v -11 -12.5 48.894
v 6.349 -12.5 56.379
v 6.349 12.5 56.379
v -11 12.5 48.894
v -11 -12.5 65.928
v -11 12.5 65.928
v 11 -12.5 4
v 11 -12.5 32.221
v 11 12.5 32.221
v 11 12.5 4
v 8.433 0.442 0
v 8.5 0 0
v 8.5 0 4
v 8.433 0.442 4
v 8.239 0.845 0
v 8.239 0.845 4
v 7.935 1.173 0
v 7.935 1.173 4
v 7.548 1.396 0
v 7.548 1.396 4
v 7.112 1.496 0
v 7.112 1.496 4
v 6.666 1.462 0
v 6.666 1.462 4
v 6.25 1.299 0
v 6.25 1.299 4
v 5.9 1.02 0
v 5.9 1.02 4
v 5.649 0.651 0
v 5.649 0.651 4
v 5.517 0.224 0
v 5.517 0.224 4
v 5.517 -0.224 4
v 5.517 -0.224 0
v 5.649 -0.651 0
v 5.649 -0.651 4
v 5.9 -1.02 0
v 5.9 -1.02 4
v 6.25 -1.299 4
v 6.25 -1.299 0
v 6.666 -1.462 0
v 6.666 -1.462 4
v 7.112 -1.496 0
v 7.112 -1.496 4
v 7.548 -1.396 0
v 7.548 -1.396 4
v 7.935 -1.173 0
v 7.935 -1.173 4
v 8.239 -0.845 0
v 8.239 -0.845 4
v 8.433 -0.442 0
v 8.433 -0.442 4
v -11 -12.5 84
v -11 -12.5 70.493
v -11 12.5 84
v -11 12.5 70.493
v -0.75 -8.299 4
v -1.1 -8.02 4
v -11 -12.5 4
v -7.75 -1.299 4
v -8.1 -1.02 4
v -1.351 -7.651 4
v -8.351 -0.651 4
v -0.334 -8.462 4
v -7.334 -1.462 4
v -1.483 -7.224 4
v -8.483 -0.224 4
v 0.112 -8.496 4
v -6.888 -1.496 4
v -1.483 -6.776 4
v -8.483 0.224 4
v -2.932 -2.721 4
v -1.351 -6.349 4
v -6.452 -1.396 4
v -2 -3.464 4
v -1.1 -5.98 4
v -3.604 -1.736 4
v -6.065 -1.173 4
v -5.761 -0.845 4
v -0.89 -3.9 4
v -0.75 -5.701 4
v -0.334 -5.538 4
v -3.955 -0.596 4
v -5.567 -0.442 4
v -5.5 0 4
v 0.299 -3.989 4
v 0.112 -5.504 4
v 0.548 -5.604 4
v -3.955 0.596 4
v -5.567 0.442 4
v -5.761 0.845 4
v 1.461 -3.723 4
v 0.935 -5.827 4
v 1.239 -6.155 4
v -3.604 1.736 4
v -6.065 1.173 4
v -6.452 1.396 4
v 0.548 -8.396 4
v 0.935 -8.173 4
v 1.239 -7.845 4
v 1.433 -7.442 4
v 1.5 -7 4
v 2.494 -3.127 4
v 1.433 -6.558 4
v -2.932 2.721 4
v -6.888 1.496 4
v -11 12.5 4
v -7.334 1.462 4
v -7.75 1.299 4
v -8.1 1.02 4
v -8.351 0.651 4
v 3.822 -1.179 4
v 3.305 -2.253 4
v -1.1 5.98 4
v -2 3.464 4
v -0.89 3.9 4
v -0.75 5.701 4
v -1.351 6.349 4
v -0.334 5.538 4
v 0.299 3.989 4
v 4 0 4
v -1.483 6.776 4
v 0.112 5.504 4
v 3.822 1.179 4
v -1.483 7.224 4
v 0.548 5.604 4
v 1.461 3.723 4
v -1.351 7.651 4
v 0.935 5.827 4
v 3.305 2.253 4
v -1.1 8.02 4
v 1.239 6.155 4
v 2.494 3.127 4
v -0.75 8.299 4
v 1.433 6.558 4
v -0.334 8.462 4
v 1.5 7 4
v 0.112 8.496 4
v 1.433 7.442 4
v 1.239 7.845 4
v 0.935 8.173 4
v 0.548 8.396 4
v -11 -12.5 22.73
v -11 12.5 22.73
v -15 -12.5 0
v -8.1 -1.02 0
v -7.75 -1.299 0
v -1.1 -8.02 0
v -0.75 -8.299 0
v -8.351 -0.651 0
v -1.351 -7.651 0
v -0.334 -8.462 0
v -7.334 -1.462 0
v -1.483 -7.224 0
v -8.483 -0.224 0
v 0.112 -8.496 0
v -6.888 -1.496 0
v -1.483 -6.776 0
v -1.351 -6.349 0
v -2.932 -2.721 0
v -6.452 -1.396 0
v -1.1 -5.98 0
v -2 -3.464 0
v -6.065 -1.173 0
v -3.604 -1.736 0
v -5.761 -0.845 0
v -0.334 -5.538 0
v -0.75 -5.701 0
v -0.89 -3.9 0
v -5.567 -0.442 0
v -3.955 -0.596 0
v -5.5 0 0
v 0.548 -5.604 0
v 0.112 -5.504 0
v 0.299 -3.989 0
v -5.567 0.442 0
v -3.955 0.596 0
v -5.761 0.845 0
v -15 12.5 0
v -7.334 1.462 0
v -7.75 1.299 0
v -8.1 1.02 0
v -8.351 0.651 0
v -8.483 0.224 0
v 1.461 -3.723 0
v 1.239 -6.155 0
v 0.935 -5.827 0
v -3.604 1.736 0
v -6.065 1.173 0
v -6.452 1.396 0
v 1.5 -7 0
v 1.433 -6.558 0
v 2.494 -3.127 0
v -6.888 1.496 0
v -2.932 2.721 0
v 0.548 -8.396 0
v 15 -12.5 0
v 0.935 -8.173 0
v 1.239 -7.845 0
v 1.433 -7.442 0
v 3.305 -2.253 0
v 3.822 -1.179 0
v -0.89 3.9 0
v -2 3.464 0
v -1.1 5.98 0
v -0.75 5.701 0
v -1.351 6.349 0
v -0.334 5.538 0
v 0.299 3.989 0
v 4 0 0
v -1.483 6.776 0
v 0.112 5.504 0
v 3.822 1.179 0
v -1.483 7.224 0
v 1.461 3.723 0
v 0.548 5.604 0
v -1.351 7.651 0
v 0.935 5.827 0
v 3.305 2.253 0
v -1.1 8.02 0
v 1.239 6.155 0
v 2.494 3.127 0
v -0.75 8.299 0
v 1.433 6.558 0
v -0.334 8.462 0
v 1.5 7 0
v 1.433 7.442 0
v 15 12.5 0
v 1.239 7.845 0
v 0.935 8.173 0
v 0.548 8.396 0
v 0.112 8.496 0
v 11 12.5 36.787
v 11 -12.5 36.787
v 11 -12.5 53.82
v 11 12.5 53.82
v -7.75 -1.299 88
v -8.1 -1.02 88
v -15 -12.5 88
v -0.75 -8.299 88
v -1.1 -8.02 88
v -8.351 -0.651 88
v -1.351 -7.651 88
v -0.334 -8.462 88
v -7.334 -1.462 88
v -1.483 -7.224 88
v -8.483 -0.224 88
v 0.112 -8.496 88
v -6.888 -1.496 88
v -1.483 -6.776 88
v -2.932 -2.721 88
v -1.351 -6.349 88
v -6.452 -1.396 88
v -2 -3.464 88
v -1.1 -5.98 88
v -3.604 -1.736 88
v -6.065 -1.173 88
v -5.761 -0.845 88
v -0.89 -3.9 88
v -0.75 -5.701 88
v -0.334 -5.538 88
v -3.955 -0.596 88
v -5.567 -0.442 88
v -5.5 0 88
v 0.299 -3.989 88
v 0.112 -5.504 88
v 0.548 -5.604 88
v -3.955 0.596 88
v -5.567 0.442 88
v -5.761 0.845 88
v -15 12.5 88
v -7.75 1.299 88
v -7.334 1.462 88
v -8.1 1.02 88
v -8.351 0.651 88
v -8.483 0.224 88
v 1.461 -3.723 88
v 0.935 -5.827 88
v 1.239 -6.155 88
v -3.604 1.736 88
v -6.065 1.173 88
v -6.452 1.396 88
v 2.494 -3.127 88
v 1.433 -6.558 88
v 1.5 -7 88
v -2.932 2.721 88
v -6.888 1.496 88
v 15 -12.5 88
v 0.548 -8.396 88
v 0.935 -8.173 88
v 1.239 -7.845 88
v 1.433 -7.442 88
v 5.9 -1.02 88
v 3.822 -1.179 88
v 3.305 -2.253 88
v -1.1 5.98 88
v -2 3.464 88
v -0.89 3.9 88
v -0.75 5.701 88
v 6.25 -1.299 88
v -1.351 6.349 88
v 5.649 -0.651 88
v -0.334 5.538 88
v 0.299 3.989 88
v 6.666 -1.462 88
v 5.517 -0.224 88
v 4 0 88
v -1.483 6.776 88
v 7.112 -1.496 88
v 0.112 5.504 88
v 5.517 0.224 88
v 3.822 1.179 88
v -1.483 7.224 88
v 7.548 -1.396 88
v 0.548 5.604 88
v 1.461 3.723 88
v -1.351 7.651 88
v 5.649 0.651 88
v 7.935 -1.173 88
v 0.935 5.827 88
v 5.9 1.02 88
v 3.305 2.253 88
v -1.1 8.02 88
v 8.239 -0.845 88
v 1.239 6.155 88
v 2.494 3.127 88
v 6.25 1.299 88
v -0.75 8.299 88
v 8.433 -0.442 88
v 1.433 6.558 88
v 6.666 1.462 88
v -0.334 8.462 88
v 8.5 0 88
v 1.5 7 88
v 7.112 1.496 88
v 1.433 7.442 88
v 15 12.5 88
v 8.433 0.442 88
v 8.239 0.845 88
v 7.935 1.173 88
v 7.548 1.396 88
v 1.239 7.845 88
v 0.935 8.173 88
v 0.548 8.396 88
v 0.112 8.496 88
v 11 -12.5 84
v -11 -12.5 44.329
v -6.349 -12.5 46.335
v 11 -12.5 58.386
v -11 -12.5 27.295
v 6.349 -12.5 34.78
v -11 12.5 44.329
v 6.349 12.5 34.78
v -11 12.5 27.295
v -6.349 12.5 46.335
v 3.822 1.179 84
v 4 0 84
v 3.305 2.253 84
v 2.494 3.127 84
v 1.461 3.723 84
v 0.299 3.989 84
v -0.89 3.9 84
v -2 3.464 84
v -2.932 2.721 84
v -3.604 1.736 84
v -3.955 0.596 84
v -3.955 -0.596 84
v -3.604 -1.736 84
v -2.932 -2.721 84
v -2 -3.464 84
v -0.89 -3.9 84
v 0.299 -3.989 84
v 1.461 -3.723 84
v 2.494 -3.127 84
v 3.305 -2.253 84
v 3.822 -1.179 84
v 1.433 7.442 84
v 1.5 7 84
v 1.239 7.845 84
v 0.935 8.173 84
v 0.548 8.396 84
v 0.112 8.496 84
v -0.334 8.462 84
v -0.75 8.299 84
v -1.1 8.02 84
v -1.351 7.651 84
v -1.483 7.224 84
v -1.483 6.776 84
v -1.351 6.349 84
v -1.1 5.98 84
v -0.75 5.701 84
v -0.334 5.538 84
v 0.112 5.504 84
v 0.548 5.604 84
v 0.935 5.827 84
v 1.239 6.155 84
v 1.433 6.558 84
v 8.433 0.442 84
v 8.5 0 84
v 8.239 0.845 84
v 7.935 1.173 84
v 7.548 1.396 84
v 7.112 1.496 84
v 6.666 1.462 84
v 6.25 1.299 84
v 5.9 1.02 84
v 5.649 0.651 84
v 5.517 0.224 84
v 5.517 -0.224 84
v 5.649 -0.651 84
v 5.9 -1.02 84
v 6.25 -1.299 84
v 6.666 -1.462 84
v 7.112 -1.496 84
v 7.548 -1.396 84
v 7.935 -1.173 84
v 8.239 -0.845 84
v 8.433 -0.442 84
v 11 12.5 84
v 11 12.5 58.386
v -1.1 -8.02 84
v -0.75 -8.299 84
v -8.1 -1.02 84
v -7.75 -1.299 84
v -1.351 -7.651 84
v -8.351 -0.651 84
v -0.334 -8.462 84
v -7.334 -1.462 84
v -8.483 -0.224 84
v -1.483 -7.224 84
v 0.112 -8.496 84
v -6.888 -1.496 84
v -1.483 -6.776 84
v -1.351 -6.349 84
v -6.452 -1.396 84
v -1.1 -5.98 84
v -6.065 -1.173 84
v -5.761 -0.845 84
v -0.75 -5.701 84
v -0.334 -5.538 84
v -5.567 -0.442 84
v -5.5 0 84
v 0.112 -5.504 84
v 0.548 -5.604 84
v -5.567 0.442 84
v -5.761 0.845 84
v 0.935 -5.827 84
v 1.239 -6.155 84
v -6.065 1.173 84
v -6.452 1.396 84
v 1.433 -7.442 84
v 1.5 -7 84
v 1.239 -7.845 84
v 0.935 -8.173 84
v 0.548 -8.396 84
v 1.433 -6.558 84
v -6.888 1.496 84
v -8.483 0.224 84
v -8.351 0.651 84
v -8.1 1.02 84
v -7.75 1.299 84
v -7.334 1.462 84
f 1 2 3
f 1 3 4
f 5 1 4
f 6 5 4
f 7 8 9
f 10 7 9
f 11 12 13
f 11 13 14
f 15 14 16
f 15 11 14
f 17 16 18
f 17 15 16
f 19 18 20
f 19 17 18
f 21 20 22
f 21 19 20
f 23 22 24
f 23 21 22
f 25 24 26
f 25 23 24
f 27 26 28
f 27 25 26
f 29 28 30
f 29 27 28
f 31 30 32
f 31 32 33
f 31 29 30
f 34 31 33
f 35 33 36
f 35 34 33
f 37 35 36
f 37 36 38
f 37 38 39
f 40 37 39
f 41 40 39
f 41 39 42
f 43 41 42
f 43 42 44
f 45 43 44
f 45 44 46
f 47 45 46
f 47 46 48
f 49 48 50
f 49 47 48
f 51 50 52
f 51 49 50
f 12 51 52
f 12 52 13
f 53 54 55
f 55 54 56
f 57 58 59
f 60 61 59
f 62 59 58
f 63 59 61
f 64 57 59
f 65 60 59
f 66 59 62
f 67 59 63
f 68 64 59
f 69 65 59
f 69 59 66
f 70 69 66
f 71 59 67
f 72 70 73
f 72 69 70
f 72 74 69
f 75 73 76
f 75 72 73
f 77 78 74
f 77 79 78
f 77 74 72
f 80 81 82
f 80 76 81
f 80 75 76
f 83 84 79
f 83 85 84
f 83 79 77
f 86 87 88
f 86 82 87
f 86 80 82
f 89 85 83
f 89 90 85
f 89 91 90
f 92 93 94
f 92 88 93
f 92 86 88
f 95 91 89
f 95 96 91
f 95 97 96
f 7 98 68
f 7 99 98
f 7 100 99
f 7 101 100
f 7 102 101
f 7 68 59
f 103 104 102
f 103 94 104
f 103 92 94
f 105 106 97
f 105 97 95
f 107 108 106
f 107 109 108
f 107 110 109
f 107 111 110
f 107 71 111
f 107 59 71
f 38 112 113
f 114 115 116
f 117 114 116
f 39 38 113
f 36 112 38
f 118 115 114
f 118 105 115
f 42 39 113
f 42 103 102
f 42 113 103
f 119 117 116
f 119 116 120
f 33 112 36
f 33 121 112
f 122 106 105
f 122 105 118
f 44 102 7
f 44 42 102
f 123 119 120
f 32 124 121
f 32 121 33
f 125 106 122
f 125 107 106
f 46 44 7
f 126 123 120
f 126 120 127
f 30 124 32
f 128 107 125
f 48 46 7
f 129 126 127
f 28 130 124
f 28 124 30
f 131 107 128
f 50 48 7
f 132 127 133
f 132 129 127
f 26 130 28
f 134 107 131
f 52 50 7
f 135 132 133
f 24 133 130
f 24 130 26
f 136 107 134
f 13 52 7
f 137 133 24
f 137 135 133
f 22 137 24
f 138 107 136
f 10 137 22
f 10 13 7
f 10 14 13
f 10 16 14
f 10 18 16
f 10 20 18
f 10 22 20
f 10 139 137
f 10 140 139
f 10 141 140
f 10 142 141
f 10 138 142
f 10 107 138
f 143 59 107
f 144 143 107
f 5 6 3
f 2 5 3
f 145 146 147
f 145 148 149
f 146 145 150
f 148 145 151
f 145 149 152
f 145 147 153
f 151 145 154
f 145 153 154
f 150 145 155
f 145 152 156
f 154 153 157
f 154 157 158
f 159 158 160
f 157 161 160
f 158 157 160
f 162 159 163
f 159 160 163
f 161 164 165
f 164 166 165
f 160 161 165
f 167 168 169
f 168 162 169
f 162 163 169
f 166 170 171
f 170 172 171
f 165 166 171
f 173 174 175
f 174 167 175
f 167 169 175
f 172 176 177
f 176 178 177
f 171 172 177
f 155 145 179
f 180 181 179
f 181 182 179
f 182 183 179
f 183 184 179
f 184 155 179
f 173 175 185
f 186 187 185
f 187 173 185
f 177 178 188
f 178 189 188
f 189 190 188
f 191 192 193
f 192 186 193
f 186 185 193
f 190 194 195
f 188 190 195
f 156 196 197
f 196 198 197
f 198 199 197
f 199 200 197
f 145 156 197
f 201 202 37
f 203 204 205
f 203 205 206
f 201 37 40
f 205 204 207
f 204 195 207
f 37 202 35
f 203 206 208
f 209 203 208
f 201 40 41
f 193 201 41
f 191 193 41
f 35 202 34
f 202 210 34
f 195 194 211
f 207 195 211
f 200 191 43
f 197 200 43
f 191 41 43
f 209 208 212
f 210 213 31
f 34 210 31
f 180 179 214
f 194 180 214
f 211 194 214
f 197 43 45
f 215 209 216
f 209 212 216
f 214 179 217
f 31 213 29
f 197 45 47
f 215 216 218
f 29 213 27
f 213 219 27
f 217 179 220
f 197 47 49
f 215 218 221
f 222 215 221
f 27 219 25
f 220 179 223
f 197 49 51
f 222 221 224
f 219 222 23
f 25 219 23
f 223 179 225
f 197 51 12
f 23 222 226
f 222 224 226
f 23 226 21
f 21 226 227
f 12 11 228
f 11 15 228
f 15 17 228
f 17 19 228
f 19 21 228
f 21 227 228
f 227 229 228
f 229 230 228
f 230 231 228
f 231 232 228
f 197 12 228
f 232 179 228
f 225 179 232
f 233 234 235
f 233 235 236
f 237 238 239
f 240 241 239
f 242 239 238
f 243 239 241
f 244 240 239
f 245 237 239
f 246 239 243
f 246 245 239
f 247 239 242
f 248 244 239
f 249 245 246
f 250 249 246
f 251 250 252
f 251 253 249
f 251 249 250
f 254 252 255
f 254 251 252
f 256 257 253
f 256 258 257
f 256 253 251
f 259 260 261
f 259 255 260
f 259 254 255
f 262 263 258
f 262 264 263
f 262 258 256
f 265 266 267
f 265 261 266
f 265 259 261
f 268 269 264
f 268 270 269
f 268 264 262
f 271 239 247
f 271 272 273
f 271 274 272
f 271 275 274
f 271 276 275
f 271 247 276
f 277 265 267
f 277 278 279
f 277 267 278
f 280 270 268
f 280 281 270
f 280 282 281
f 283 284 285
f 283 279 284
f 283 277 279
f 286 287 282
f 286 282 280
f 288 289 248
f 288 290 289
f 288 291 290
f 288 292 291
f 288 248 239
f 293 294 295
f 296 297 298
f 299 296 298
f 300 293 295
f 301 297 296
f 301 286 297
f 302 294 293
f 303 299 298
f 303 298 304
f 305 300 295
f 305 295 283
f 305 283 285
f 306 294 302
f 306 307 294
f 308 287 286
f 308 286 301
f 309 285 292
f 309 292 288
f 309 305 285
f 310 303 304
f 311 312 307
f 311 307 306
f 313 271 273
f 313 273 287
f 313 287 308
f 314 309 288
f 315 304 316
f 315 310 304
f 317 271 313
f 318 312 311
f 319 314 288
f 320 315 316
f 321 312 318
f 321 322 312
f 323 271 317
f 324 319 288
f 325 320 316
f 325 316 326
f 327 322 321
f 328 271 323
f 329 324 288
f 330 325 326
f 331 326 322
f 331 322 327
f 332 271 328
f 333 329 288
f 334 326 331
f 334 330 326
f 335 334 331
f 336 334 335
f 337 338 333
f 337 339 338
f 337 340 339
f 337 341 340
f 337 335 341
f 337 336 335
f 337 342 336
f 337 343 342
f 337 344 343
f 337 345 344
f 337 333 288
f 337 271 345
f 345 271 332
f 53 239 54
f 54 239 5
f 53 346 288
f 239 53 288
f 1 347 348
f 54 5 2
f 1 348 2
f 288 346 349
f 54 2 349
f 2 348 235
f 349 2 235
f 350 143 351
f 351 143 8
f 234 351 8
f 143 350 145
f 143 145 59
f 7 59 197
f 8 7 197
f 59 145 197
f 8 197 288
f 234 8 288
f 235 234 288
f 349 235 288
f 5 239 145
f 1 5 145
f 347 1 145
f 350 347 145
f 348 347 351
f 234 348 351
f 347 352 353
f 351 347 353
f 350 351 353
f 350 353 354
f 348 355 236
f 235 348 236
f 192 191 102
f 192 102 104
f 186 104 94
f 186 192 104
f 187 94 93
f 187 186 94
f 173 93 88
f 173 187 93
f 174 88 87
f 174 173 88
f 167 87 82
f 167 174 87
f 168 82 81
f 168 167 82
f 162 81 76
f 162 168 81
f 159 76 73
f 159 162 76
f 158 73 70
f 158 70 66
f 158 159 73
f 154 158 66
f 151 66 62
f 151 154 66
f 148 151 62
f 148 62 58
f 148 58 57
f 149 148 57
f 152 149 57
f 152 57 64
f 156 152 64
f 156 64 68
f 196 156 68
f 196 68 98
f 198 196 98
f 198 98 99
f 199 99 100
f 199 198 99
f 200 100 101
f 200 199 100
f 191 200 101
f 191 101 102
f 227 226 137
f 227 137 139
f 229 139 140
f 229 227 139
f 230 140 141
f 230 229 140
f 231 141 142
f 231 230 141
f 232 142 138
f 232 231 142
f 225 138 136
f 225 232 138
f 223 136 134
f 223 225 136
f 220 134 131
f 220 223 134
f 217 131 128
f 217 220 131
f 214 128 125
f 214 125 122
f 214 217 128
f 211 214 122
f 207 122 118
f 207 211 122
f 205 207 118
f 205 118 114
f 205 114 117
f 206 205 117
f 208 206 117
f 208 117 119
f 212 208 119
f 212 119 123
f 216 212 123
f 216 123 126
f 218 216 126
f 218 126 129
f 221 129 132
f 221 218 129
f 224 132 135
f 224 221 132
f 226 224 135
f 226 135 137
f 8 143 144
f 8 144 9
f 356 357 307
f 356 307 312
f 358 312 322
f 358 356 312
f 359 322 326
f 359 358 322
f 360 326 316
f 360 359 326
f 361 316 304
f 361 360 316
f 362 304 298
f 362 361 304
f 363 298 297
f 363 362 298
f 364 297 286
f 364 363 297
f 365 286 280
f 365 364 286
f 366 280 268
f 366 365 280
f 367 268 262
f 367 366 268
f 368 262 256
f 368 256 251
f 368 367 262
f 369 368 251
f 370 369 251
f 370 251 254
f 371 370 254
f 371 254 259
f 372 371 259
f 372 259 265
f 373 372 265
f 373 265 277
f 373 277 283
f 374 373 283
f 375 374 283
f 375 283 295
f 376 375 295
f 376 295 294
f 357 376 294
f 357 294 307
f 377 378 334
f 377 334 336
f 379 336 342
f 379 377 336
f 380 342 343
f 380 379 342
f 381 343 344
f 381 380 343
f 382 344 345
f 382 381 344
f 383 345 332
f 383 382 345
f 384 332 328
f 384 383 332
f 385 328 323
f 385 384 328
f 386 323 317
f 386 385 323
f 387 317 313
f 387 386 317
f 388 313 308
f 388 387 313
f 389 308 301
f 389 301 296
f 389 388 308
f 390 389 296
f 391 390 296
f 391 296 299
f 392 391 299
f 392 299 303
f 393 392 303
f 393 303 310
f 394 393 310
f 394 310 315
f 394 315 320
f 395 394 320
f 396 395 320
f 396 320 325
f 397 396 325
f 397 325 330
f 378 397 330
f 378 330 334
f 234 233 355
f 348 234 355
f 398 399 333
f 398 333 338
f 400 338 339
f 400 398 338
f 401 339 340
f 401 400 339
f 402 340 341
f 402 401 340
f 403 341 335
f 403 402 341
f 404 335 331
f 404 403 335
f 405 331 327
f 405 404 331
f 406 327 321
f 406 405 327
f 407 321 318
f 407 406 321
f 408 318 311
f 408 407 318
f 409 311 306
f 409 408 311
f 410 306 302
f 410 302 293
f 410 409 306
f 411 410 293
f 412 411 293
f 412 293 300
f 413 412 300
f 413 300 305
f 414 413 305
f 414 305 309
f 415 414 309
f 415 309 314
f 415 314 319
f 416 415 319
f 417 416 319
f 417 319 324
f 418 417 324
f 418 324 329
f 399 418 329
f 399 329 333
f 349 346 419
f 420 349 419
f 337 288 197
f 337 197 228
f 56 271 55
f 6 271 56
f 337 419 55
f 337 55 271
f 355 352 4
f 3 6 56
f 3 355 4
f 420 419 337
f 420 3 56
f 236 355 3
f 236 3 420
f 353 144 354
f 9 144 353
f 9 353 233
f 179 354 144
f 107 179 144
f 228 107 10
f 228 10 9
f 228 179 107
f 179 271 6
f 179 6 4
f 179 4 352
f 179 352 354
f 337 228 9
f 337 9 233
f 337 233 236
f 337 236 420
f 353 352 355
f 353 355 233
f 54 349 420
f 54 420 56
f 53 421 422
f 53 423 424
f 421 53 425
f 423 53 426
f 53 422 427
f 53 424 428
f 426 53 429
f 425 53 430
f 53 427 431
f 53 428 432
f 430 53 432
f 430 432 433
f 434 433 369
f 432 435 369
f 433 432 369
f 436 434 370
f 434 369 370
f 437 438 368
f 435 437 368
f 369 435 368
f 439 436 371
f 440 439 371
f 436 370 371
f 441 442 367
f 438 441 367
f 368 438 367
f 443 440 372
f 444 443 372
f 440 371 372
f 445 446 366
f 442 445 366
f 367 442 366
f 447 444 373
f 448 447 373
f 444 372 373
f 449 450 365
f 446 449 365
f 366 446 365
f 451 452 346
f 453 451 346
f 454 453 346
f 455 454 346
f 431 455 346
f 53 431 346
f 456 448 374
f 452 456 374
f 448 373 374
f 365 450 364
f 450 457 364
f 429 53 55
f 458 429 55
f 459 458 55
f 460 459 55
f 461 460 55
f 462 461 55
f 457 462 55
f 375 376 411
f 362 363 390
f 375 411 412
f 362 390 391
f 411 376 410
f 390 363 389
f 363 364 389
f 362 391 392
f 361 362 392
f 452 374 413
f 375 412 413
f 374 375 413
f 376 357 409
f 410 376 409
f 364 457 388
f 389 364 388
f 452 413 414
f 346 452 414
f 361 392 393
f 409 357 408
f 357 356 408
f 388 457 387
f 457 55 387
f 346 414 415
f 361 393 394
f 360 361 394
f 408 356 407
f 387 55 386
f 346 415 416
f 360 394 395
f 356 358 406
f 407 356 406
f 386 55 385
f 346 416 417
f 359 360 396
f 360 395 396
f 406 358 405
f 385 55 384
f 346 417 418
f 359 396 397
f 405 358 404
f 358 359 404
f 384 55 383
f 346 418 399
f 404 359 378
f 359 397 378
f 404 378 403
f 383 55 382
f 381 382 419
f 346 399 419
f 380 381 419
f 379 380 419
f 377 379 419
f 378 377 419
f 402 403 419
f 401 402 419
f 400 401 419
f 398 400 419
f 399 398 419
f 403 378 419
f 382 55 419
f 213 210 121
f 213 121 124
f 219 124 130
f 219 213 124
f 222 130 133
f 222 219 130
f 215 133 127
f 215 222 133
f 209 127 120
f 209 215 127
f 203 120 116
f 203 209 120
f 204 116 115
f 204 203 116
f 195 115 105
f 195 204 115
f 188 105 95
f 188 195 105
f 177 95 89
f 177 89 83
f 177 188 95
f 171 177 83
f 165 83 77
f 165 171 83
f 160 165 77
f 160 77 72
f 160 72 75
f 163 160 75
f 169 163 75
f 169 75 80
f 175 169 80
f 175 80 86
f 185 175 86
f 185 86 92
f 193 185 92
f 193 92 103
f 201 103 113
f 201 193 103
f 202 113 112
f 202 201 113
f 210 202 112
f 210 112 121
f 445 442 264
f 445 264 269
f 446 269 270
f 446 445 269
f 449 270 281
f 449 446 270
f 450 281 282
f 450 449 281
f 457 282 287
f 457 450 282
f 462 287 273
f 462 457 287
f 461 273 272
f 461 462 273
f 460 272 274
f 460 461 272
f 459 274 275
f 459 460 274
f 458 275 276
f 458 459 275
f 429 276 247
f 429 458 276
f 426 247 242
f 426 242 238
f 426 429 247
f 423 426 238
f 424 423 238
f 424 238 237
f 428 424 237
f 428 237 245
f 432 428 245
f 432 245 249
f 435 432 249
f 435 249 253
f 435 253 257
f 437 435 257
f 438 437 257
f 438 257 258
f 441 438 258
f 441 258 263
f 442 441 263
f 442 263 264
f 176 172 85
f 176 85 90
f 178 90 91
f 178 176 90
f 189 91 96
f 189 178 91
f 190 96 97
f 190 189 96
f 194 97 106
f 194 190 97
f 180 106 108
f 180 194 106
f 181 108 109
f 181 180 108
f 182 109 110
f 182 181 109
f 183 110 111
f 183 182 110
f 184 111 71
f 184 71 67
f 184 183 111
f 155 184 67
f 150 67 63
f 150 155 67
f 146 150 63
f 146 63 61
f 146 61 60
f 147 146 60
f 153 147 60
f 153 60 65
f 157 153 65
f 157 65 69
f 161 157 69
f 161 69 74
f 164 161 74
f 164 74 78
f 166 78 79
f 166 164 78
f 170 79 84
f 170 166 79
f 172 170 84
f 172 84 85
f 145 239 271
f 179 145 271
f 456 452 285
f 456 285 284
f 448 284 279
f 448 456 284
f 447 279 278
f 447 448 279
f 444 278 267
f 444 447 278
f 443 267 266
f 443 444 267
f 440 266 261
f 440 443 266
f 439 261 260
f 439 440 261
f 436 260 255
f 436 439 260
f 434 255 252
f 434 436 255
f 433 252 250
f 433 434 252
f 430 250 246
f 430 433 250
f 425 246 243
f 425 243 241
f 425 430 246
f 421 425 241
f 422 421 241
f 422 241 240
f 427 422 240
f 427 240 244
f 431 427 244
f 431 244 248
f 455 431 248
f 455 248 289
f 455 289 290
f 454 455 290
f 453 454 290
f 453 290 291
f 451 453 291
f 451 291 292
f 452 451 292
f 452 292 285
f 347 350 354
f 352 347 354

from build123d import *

# Parameters (mm, degrees)
SKETCH_1_W          = 30
SKETCH_1_H          = 25
SKETCH_1_R          = 1.5
SKETCH_1_R_2        = 4
EXTRUDE_1_DEPTH     = 4
SKETCH_2_W          = 4
SKETCH_2_H          = 25
EXTRUDE_2_DEPTH     = 80
SKETCH_3_W          = 30
SKETCH_3_H          = 25
EXTRUDE_3_DEPTH     = 4
CUT_EXTRUDE_START   = -11
SKETCH_4_R          = 1.5
SKETCH_4_R_2        = 4
CUT_EXTRUDE_1_DEPTH = 11
EXTRUDE_4_DEPTH     = 25


with BuildPart() as part:
    # 草图1 → 凸台-拉伸1 (new body)
    with BuildSketch(Plane.XY):
        Rectangle(SKETCH_1_W, SKETCH_1_H)
        with Locations((7, 0)):
            Circle(SKETCH_1_R, mode=Mode.SUBTRACT)
        with Locations((0, 7)):
            Circle(SKETCH_1_R, mode=Mode.SUBTRACT)
        with Locations((-7, 0)):
            Circle(SKETCH_1_R, mode=Mode.SUBTRACT)
        with Locations((0, -7)):
            Circle(SKETCH_1_R, mode=Mode.SUBTRACT)
        Circle(SKETCH_1_R_2, mode=Mode.SUBTRACT)
    extrude(amount=EXTRUDE_1_DEPTH)

    # 草图2 → 凸台-拉伸2 (add)
    with BuildSketch(Plane.XY.offset(4)):
        with Locations((-13, 0)):
            Rectangle(SKETCH_2_W, SKETCH_2_H)
        with Locations((13, 0)):
            Rectangle(SKETCH_2_W, SKETCH_2_H)
    extrude(amount=EXTRUDE_2_DEPTH)

    # 草图3 → 凸台-拉伸3 (add)
    with BuildSketch(Plane.XY.offset(84)):
        Rectangle(SKETCH_3_W, SKETCH_3_H)
    extrude(amount=EXTRUDE_3_DEPTH)

    # 草图4 → 切除-拉伸1 (cut)
    with BuildSketch(Plane.XY.offset(88).offset(CUT_EXTRUDE_START)):
        with Locations((-7, 0)):
            Circle(SKETCH_4_R)
        with Locations((0, -7)):
            Circle(SKETCH_4_R)
        with Locations((7, 0)):
            Circle(SKETCH_4_R)
        Circle(SKETCH_4_R_2)
        with Locations((0, 7)):
            Circle(SKETCH_4_R)
    extrude(amount=CUT_EXTRUDE_1_DEPTH, mode=Mode.SUBTRACT)

    # 草图9 → 凸台-拉伸4 (add)
    with BuildSketch(Plane.XZ.offset(12.5)):
        Polygon((11, 58.385569275), (-11, 70.493433903), (-11, 65.927659735), (6.349452589, 56.379258675), align=None)
        Polygon((11, 53.819795107), (11, 58.385569275), (6.349452589, 56.379258675), align=None)
        Polygon((-6.349452589, 46.335000836), (11, 53.819795107), (6.349452589, 56.379258675), (-11, 48.894464404), align=None)
        Polygon((-6.349452589, 46.335000836), (-11, 48.894464404), (-11, 44.328690237), align=None)
        Polygon((11, 36.786599776), (-6.349452589, 46.335000836), (-11, 44.328690237), (6.349452589, 34.780289177), align=None)
        Polygon((11, 32.220825609), (11, 36.786599776), (6.349452589, 34.780289177), align=None)
        Polygon((-11, 22.729720739), (11, 32.220825609), (6.349452589, 34.780289177), (-11, 27.295494906), align=None)
    extrude(amount=-EXTRUDE_4_DEPTH)


solid = part.part
